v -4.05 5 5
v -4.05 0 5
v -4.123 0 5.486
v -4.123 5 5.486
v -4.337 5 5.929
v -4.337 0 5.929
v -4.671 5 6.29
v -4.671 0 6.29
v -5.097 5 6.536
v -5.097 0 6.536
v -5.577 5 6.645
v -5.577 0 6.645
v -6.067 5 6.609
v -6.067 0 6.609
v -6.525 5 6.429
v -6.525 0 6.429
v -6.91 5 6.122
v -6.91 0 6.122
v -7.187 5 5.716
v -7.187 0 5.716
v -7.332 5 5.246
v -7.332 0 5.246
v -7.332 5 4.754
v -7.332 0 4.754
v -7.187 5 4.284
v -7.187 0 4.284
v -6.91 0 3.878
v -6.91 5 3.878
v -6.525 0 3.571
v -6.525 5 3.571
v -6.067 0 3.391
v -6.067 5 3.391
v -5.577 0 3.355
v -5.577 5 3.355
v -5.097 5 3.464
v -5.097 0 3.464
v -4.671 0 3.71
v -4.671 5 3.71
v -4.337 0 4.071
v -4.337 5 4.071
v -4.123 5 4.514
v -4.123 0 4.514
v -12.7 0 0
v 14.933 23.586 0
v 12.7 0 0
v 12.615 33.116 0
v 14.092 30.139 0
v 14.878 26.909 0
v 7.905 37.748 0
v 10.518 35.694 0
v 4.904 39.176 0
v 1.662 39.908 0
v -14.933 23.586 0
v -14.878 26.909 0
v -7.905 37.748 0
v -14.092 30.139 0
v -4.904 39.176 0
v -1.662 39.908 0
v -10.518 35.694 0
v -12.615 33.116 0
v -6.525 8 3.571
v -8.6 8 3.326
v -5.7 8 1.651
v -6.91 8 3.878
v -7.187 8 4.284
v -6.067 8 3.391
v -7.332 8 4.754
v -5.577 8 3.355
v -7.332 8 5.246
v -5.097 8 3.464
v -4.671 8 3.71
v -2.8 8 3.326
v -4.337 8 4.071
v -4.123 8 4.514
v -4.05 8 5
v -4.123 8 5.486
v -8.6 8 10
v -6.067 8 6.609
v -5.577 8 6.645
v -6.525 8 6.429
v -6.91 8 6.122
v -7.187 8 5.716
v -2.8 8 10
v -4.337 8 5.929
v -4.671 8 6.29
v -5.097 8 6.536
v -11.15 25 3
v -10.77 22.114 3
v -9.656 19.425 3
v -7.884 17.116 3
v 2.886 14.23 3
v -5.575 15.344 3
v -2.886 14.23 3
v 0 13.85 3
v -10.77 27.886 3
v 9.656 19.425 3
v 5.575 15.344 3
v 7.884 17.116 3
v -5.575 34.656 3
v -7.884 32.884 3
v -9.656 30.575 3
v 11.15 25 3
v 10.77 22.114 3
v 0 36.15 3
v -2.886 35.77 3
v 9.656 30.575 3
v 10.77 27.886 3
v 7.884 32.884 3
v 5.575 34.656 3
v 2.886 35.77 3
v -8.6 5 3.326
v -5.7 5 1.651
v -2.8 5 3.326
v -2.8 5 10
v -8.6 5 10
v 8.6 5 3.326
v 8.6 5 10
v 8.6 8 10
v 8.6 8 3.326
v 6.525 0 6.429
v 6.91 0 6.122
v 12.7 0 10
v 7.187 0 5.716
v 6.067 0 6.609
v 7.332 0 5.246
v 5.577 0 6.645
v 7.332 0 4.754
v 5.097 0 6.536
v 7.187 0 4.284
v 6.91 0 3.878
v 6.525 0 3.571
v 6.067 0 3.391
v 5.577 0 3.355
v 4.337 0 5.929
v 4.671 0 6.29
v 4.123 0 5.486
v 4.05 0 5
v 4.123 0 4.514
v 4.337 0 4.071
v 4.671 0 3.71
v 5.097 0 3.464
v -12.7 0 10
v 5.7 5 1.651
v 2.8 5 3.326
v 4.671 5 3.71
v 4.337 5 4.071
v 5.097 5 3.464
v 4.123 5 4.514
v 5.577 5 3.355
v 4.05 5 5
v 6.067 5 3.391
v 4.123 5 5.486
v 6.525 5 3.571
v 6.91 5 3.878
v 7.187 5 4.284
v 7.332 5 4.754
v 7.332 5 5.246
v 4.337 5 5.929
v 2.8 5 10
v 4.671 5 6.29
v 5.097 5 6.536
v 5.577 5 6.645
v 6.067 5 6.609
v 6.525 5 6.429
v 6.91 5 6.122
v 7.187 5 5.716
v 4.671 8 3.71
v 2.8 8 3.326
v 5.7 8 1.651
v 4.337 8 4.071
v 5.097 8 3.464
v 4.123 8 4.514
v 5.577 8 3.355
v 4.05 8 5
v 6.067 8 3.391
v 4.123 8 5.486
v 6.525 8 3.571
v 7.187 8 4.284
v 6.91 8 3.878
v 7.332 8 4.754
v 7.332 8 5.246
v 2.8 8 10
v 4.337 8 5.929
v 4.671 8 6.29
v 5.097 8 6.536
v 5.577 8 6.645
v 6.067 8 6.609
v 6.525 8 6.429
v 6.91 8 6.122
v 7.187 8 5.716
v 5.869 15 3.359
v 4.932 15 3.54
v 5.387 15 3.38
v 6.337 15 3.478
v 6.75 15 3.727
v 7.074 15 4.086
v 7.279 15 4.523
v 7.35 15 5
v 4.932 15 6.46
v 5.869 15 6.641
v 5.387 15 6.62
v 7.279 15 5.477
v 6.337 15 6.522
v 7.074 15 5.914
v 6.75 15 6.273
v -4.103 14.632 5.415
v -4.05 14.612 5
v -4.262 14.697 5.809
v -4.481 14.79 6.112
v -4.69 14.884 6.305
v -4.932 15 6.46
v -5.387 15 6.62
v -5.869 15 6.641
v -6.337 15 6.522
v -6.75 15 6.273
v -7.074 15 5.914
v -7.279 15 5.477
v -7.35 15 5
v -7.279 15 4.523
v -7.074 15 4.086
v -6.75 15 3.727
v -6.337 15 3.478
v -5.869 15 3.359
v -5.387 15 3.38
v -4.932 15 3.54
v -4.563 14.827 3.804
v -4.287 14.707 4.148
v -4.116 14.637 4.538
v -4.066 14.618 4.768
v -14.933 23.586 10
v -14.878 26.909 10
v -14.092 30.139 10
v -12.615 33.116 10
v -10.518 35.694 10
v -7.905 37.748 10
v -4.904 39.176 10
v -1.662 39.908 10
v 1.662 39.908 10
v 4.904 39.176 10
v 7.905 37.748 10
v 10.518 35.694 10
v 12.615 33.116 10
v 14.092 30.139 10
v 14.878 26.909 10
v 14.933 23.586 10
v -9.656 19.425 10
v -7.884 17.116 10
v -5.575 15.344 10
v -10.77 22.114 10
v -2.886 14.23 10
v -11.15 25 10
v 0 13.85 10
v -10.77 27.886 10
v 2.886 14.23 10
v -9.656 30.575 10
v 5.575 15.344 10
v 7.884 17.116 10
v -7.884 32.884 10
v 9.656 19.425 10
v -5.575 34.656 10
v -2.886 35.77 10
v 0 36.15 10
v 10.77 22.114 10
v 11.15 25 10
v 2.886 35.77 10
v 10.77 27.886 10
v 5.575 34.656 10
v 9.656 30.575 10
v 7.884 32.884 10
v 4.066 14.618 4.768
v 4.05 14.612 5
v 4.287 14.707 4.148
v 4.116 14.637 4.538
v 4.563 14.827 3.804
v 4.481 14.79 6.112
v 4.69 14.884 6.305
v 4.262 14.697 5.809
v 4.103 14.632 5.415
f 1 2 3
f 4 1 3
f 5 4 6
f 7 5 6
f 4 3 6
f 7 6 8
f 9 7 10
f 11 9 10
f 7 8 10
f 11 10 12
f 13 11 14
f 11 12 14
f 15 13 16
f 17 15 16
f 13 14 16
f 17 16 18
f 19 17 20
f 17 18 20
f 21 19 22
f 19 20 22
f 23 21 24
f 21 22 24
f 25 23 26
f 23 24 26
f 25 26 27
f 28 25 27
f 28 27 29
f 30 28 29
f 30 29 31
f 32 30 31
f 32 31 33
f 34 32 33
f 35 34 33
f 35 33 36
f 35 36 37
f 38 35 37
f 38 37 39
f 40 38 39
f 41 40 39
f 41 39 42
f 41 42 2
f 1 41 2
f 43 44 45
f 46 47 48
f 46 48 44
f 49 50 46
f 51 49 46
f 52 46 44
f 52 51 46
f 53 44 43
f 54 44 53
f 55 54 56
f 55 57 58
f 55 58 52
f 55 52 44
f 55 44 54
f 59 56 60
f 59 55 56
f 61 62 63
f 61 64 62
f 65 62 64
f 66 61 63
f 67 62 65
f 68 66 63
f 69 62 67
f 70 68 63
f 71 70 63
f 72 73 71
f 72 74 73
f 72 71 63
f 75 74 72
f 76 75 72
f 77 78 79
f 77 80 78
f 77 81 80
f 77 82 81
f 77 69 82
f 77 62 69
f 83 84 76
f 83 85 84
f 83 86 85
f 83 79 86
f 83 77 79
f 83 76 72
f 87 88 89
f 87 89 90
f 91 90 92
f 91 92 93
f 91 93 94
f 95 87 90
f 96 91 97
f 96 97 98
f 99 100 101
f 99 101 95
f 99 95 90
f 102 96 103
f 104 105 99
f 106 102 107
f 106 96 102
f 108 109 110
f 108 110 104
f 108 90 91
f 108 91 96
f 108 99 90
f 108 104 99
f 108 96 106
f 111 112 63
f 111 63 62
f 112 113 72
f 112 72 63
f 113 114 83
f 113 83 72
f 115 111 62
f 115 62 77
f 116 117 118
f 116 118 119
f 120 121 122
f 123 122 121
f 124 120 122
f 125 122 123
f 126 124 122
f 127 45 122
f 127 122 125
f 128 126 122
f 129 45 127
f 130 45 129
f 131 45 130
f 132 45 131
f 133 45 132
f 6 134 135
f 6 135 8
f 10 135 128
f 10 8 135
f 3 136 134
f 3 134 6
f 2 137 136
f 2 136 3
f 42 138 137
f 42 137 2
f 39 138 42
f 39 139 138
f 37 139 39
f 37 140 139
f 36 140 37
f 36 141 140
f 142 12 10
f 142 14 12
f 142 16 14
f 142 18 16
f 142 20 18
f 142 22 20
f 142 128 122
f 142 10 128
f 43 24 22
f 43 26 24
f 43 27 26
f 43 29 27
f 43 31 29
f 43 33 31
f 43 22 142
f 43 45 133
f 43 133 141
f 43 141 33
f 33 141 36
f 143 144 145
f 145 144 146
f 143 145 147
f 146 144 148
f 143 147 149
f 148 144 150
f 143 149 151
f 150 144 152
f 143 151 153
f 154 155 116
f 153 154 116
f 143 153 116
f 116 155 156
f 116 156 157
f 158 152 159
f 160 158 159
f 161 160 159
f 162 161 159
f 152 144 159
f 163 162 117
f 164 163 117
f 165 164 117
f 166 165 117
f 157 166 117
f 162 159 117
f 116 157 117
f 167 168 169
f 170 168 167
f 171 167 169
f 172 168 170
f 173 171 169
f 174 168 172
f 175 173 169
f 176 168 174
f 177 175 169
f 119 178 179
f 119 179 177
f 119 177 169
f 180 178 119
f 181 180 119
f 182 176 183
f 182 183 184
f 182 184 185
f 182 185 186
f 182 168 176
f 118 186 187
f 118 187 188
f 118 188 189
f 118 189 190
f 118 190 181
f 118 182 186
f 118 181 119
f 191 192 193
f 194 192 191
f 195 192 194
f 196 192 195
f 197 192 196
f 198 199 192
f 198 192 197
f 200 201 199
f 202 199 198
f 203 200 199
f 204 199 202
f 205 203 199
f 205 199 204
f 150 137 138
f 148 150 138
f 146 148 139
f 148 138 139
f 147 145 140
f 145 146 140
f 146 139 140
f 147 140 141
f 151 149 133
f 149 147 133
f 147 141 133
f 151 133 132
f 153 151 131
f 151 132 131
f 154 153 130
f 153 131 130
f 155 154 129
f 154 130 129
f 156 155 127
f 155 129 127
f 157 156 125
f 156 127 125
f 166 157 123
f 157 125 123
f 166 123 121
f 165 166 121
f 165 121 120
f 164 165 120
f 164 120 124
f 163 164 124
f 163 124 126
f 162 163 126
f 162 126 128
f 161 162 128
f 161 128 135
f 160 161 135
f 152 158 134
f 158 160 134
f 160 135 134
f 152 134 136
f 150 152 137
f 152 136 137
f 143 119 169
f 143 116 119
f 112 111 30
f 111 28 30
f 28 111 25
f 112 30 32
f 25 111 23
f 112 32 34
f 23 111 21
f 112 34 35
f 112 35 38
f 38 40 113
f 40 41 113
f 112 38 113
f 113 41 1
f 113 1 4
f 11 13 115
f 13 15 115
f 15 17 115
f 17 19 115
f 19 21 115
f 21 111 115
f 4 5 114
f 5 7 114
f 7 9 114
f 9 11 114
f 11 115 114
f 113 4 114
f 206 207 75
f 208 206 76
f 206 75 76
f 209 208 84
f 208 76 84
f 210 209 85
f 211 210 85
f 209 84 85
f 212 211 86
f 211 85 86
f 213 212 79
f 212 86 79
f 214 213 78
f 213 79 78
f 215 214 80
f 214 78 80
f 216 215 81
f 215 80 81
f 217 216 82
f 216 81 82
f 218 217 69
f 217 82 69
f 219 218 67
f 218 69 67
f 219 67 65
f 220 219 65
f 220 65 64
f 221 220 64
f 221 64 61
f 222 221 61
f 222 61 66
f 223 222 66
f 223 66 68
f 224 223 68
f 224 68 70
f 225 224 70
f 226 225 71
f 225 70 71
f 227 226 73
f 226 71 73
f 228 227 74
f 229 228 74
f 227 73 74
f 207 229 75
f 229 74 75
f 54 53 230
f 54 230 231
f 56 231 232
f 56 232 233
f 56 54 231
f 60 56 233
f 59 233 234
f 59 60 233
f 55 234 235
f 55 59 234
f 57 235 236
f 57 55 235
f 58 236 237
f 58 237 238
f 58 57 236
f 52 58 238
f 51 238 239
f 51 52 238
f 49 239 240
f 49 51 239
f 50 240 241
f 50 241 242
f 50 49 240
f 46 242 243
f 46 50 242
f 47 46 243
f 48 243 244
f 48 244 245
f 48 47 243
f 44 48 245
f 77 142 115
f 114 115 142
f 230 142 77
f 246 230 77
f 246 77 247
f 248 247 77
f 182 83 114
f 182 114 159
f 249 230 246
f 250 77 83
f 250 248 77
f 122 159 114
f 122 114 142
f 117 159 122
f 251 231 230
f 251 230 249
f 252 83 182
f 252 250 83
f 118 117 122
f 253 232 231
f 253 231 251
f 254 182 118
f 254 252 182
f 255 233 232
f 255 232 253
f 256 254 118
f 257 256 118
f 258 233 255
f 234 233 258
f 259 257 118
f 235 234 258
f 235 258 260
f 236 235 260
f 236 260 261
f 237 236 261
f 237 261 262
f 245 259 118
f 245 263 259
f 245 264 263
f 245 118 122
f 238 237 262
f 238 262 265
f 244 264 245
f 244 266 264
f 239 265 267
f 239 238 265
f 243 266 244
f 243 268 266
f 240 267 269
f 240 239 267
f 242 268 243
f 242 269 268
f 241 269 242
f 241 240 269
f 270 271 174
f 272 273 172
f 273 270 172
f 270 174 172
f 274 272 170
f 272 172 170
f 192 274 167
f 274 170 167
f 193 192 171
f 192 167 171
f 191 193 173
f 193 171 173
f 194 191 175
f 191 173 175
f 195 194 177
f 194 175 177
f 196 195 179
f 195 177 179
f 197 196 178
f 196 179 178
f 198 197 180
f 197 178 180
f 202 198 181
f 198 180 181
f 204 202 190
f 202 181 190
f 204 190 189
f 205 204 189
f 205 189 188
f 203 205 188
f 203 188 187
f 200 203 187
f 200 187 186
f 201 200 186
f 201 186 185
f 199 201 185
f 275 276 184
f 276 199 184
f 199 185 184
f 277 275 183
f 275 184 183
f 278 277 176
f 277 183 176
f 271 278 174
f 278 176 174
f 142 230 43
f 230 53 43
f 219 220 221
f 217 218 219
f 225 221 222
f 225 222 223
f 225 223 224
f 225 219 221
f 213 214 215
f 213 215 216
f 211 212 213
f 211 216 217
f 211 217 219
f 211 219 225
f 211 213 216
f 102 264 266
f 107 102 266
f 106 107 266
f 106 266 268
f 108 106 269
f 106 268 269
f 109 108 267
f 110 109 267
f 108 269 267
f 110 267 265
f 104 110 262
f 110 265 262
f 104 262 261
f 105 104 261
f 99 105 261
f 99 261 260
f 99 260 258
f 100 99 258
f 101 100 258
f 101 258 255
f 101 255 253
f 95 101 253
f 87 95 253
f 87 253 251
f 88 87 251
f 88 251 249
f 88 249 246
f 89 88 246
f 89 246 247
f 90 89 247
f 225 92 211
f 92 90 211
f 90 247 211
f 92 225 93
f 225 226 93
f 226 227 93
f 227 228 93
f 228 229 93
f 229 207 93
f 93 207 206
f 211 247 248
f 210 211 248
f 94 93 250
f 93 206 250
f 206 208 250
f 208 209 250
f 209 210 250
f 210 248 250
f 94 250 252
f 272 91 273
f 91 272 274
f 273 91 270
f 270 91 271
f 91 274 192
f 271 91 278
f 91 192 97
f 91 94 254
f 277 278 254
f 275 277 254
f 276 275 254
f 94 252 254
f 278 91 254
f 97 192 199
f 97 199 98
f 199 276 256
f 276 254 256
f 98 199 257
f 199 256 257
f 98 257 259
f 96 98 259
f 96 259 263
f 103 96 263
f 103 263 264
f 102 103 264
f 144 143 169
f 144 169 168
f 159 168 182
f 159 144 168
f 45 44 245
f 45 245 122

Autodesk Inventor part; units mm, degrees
ref_plane "YZ Plane" through (0, 0, 0) normal (1, 0, 0) x (0, 1, 0)
ref_plane "XZ Plane" through (0, 0, 0) normal (0, 1, 0) x (-1, 0, 0)
ref_plane "XY Plane" through (0, 0, 0) normal (0, 0, 1) x (1, 0, 0)
sketch "Sketch1" plane through (0, 0, 0) normal (0, 0, 1) x (1, 0, 0)
  circle A0 centre (0, 25) radius 4.1
  circle A1 centre (0, 25) radius 15
  line L0 (-14.9332, 23.5861) -> (-12.7, 0)
  line L1 (-12.7, 0) -> (0, 0)
  line L2 (0, 0) -> (0, 25)
  line L3 (14.9332, 23.5861) -> (12.7, 0)
  line L4 (12.7, 0) -> (0, 0)
  circle A2 centre (0, 25) radius 11.15
  point P0 (14.9332, 23.5861)
  dimension "d1" = 30
  dimension "d0" = 8.2
  dimension "d2" = 25.4
  dimension "d5" = 25
  dimension "d16" = 22.3
extrude "Extrusion1" add sketch "Sketch1" along normal blind 10 contours A2 | A1 | A1 L3 L4 L2 | L2 L1 L0 A1
sketch "Sketch2" plane through (-12.7, 0, 0) normal (0, -1, 0) x (1, 0, 0)
  line L0 (0, 0) -> (25.4, 0) projected
  line L1 (25.4, 0) -> (25.4, 10) projected
  line L2 (0, 10) -> (25.4, 10) projected
  line L3 (0, 0) -> (0, 10) projected
  circle A0 centre (7, 5) radius 1.65
  point P0 (12.7, 0)
  point P1 (0, 5)
  dimension "d6" = 3.3
  dimension "d7" = 7
extrude "Extrusion2" cut sketch "Sketch2" against normal blind 15 contours A0
ref_plane "Work Plane1" through (-12.7, 5, 0) normal (0, -1, 0) x (1, 0, 0)
sketch "Sketch3" plane through (-12.7, 5, 0) normal (0, -1, 0) x (1, 0, 0)
  circle A0 centre (7, 5) radius 1.65 projected
  line L0 (9.9, 6.6743) -> (9.9, 3.3257)
  line L1 (9.9, 3.3257) -> (7, 1.6514)
  line L2 (7, 1.6514) -> (4.1, 3.3257)
  line L3 (4.1, 3.3257) -> (4.1, 6.6743)
  line L4 (4.1, 6.6743) -> (7, 8.3486)
  line L5 (7, 8.3486) -> (9.9, 6.6743)
  line L6 (4.1, 6.6743) -> (9.9, 6.6743)
  line L7 (9.9, 6.6743) -> (9.9, 13.9222)
  line L8 (9.9, 13.9222) -> (4.1, 13.9222)
  line L9 (4.1, 13.9222) -> (4.1, 6.6743)
  point P0 (12.7, 0)
  dimension "d11" = 5.8
extrude "Extrusion3" cut sketch "Sketch3" against normal blind 3
mirror "Mirror1" about plane through (0, 0, 0) normal (1, 0, 0) of "Extrusion3", "Extrusion2"
sketch "Sketch4" plane through (0, 0, 0) normal (0, 0, -1) x (-1, 0, 0)
  line L0 (12.7, 0) -> (-12.7, 0) projected
  line L1 (14.9332, 23.5861) -> (12.7, 0) projected
  arc A0 (14.9332, 23.5861) -> (-14.9332, 23.5861) centre (0, 25) ccw projected
  line L2 (-12.7, 0) -> (-14.9332, 23.5861) projected
  circle A1 centre (0, 25) radius 4.1 projected
  point P0 (0, 0)
extrude "Extrusion4" add sketch "Sketch4" against normal blind 3 contours A1
sketch "Sketch5" plane through (0, 0, 10) normal (0, 0, 1) x (1, 0, 0)
  line L0 (8.6, 8) -> (8.6, 5) projected
  line L1 (8.6, 5) -> (2.8, 5) projected
  line L2 (2.8, 5) -> (2.8, 8) projected
  line L3 (2.8, 8) -> (8.6, 8) projected
  line L4 (-8.6, 5) -> (-8.6, 8) projected
  line L5 (-8.6, 8) -> (-2.8, 8) projected
  line L6 (-2.8, 8) -> (-2.8, 5) projected
  line L7 (-2.8, 5) -> (-8.6, 5) projected
  line L8 (-12.7, 0) -> (12.7, 0) projected
  line L9 (12.7, 0) -> (14.9332, 23.5861) projected
  arc A0 (14.9332, 23.5861) -> (-14.9332, 23.5861) centre (0, 25) ccw projected
  line L10 (-14.9332, 23.5861) -> (-12.7, 0) projected
  circle A1 centre (0, 25) radius 4.1 projected
  circle A2 centre (0, 25) radius 4.1 projected
  circle A3 centre (0, 25) radius 11.15
  point P0 (0, 0)
  dimension "d17" = 22.3
extrude "Extrusion5" cut sketch "Sketch5" against normal blind 7 contours A3
properties part number "OTRO_EXTREMO" material "Steel, Mild, Welded"
